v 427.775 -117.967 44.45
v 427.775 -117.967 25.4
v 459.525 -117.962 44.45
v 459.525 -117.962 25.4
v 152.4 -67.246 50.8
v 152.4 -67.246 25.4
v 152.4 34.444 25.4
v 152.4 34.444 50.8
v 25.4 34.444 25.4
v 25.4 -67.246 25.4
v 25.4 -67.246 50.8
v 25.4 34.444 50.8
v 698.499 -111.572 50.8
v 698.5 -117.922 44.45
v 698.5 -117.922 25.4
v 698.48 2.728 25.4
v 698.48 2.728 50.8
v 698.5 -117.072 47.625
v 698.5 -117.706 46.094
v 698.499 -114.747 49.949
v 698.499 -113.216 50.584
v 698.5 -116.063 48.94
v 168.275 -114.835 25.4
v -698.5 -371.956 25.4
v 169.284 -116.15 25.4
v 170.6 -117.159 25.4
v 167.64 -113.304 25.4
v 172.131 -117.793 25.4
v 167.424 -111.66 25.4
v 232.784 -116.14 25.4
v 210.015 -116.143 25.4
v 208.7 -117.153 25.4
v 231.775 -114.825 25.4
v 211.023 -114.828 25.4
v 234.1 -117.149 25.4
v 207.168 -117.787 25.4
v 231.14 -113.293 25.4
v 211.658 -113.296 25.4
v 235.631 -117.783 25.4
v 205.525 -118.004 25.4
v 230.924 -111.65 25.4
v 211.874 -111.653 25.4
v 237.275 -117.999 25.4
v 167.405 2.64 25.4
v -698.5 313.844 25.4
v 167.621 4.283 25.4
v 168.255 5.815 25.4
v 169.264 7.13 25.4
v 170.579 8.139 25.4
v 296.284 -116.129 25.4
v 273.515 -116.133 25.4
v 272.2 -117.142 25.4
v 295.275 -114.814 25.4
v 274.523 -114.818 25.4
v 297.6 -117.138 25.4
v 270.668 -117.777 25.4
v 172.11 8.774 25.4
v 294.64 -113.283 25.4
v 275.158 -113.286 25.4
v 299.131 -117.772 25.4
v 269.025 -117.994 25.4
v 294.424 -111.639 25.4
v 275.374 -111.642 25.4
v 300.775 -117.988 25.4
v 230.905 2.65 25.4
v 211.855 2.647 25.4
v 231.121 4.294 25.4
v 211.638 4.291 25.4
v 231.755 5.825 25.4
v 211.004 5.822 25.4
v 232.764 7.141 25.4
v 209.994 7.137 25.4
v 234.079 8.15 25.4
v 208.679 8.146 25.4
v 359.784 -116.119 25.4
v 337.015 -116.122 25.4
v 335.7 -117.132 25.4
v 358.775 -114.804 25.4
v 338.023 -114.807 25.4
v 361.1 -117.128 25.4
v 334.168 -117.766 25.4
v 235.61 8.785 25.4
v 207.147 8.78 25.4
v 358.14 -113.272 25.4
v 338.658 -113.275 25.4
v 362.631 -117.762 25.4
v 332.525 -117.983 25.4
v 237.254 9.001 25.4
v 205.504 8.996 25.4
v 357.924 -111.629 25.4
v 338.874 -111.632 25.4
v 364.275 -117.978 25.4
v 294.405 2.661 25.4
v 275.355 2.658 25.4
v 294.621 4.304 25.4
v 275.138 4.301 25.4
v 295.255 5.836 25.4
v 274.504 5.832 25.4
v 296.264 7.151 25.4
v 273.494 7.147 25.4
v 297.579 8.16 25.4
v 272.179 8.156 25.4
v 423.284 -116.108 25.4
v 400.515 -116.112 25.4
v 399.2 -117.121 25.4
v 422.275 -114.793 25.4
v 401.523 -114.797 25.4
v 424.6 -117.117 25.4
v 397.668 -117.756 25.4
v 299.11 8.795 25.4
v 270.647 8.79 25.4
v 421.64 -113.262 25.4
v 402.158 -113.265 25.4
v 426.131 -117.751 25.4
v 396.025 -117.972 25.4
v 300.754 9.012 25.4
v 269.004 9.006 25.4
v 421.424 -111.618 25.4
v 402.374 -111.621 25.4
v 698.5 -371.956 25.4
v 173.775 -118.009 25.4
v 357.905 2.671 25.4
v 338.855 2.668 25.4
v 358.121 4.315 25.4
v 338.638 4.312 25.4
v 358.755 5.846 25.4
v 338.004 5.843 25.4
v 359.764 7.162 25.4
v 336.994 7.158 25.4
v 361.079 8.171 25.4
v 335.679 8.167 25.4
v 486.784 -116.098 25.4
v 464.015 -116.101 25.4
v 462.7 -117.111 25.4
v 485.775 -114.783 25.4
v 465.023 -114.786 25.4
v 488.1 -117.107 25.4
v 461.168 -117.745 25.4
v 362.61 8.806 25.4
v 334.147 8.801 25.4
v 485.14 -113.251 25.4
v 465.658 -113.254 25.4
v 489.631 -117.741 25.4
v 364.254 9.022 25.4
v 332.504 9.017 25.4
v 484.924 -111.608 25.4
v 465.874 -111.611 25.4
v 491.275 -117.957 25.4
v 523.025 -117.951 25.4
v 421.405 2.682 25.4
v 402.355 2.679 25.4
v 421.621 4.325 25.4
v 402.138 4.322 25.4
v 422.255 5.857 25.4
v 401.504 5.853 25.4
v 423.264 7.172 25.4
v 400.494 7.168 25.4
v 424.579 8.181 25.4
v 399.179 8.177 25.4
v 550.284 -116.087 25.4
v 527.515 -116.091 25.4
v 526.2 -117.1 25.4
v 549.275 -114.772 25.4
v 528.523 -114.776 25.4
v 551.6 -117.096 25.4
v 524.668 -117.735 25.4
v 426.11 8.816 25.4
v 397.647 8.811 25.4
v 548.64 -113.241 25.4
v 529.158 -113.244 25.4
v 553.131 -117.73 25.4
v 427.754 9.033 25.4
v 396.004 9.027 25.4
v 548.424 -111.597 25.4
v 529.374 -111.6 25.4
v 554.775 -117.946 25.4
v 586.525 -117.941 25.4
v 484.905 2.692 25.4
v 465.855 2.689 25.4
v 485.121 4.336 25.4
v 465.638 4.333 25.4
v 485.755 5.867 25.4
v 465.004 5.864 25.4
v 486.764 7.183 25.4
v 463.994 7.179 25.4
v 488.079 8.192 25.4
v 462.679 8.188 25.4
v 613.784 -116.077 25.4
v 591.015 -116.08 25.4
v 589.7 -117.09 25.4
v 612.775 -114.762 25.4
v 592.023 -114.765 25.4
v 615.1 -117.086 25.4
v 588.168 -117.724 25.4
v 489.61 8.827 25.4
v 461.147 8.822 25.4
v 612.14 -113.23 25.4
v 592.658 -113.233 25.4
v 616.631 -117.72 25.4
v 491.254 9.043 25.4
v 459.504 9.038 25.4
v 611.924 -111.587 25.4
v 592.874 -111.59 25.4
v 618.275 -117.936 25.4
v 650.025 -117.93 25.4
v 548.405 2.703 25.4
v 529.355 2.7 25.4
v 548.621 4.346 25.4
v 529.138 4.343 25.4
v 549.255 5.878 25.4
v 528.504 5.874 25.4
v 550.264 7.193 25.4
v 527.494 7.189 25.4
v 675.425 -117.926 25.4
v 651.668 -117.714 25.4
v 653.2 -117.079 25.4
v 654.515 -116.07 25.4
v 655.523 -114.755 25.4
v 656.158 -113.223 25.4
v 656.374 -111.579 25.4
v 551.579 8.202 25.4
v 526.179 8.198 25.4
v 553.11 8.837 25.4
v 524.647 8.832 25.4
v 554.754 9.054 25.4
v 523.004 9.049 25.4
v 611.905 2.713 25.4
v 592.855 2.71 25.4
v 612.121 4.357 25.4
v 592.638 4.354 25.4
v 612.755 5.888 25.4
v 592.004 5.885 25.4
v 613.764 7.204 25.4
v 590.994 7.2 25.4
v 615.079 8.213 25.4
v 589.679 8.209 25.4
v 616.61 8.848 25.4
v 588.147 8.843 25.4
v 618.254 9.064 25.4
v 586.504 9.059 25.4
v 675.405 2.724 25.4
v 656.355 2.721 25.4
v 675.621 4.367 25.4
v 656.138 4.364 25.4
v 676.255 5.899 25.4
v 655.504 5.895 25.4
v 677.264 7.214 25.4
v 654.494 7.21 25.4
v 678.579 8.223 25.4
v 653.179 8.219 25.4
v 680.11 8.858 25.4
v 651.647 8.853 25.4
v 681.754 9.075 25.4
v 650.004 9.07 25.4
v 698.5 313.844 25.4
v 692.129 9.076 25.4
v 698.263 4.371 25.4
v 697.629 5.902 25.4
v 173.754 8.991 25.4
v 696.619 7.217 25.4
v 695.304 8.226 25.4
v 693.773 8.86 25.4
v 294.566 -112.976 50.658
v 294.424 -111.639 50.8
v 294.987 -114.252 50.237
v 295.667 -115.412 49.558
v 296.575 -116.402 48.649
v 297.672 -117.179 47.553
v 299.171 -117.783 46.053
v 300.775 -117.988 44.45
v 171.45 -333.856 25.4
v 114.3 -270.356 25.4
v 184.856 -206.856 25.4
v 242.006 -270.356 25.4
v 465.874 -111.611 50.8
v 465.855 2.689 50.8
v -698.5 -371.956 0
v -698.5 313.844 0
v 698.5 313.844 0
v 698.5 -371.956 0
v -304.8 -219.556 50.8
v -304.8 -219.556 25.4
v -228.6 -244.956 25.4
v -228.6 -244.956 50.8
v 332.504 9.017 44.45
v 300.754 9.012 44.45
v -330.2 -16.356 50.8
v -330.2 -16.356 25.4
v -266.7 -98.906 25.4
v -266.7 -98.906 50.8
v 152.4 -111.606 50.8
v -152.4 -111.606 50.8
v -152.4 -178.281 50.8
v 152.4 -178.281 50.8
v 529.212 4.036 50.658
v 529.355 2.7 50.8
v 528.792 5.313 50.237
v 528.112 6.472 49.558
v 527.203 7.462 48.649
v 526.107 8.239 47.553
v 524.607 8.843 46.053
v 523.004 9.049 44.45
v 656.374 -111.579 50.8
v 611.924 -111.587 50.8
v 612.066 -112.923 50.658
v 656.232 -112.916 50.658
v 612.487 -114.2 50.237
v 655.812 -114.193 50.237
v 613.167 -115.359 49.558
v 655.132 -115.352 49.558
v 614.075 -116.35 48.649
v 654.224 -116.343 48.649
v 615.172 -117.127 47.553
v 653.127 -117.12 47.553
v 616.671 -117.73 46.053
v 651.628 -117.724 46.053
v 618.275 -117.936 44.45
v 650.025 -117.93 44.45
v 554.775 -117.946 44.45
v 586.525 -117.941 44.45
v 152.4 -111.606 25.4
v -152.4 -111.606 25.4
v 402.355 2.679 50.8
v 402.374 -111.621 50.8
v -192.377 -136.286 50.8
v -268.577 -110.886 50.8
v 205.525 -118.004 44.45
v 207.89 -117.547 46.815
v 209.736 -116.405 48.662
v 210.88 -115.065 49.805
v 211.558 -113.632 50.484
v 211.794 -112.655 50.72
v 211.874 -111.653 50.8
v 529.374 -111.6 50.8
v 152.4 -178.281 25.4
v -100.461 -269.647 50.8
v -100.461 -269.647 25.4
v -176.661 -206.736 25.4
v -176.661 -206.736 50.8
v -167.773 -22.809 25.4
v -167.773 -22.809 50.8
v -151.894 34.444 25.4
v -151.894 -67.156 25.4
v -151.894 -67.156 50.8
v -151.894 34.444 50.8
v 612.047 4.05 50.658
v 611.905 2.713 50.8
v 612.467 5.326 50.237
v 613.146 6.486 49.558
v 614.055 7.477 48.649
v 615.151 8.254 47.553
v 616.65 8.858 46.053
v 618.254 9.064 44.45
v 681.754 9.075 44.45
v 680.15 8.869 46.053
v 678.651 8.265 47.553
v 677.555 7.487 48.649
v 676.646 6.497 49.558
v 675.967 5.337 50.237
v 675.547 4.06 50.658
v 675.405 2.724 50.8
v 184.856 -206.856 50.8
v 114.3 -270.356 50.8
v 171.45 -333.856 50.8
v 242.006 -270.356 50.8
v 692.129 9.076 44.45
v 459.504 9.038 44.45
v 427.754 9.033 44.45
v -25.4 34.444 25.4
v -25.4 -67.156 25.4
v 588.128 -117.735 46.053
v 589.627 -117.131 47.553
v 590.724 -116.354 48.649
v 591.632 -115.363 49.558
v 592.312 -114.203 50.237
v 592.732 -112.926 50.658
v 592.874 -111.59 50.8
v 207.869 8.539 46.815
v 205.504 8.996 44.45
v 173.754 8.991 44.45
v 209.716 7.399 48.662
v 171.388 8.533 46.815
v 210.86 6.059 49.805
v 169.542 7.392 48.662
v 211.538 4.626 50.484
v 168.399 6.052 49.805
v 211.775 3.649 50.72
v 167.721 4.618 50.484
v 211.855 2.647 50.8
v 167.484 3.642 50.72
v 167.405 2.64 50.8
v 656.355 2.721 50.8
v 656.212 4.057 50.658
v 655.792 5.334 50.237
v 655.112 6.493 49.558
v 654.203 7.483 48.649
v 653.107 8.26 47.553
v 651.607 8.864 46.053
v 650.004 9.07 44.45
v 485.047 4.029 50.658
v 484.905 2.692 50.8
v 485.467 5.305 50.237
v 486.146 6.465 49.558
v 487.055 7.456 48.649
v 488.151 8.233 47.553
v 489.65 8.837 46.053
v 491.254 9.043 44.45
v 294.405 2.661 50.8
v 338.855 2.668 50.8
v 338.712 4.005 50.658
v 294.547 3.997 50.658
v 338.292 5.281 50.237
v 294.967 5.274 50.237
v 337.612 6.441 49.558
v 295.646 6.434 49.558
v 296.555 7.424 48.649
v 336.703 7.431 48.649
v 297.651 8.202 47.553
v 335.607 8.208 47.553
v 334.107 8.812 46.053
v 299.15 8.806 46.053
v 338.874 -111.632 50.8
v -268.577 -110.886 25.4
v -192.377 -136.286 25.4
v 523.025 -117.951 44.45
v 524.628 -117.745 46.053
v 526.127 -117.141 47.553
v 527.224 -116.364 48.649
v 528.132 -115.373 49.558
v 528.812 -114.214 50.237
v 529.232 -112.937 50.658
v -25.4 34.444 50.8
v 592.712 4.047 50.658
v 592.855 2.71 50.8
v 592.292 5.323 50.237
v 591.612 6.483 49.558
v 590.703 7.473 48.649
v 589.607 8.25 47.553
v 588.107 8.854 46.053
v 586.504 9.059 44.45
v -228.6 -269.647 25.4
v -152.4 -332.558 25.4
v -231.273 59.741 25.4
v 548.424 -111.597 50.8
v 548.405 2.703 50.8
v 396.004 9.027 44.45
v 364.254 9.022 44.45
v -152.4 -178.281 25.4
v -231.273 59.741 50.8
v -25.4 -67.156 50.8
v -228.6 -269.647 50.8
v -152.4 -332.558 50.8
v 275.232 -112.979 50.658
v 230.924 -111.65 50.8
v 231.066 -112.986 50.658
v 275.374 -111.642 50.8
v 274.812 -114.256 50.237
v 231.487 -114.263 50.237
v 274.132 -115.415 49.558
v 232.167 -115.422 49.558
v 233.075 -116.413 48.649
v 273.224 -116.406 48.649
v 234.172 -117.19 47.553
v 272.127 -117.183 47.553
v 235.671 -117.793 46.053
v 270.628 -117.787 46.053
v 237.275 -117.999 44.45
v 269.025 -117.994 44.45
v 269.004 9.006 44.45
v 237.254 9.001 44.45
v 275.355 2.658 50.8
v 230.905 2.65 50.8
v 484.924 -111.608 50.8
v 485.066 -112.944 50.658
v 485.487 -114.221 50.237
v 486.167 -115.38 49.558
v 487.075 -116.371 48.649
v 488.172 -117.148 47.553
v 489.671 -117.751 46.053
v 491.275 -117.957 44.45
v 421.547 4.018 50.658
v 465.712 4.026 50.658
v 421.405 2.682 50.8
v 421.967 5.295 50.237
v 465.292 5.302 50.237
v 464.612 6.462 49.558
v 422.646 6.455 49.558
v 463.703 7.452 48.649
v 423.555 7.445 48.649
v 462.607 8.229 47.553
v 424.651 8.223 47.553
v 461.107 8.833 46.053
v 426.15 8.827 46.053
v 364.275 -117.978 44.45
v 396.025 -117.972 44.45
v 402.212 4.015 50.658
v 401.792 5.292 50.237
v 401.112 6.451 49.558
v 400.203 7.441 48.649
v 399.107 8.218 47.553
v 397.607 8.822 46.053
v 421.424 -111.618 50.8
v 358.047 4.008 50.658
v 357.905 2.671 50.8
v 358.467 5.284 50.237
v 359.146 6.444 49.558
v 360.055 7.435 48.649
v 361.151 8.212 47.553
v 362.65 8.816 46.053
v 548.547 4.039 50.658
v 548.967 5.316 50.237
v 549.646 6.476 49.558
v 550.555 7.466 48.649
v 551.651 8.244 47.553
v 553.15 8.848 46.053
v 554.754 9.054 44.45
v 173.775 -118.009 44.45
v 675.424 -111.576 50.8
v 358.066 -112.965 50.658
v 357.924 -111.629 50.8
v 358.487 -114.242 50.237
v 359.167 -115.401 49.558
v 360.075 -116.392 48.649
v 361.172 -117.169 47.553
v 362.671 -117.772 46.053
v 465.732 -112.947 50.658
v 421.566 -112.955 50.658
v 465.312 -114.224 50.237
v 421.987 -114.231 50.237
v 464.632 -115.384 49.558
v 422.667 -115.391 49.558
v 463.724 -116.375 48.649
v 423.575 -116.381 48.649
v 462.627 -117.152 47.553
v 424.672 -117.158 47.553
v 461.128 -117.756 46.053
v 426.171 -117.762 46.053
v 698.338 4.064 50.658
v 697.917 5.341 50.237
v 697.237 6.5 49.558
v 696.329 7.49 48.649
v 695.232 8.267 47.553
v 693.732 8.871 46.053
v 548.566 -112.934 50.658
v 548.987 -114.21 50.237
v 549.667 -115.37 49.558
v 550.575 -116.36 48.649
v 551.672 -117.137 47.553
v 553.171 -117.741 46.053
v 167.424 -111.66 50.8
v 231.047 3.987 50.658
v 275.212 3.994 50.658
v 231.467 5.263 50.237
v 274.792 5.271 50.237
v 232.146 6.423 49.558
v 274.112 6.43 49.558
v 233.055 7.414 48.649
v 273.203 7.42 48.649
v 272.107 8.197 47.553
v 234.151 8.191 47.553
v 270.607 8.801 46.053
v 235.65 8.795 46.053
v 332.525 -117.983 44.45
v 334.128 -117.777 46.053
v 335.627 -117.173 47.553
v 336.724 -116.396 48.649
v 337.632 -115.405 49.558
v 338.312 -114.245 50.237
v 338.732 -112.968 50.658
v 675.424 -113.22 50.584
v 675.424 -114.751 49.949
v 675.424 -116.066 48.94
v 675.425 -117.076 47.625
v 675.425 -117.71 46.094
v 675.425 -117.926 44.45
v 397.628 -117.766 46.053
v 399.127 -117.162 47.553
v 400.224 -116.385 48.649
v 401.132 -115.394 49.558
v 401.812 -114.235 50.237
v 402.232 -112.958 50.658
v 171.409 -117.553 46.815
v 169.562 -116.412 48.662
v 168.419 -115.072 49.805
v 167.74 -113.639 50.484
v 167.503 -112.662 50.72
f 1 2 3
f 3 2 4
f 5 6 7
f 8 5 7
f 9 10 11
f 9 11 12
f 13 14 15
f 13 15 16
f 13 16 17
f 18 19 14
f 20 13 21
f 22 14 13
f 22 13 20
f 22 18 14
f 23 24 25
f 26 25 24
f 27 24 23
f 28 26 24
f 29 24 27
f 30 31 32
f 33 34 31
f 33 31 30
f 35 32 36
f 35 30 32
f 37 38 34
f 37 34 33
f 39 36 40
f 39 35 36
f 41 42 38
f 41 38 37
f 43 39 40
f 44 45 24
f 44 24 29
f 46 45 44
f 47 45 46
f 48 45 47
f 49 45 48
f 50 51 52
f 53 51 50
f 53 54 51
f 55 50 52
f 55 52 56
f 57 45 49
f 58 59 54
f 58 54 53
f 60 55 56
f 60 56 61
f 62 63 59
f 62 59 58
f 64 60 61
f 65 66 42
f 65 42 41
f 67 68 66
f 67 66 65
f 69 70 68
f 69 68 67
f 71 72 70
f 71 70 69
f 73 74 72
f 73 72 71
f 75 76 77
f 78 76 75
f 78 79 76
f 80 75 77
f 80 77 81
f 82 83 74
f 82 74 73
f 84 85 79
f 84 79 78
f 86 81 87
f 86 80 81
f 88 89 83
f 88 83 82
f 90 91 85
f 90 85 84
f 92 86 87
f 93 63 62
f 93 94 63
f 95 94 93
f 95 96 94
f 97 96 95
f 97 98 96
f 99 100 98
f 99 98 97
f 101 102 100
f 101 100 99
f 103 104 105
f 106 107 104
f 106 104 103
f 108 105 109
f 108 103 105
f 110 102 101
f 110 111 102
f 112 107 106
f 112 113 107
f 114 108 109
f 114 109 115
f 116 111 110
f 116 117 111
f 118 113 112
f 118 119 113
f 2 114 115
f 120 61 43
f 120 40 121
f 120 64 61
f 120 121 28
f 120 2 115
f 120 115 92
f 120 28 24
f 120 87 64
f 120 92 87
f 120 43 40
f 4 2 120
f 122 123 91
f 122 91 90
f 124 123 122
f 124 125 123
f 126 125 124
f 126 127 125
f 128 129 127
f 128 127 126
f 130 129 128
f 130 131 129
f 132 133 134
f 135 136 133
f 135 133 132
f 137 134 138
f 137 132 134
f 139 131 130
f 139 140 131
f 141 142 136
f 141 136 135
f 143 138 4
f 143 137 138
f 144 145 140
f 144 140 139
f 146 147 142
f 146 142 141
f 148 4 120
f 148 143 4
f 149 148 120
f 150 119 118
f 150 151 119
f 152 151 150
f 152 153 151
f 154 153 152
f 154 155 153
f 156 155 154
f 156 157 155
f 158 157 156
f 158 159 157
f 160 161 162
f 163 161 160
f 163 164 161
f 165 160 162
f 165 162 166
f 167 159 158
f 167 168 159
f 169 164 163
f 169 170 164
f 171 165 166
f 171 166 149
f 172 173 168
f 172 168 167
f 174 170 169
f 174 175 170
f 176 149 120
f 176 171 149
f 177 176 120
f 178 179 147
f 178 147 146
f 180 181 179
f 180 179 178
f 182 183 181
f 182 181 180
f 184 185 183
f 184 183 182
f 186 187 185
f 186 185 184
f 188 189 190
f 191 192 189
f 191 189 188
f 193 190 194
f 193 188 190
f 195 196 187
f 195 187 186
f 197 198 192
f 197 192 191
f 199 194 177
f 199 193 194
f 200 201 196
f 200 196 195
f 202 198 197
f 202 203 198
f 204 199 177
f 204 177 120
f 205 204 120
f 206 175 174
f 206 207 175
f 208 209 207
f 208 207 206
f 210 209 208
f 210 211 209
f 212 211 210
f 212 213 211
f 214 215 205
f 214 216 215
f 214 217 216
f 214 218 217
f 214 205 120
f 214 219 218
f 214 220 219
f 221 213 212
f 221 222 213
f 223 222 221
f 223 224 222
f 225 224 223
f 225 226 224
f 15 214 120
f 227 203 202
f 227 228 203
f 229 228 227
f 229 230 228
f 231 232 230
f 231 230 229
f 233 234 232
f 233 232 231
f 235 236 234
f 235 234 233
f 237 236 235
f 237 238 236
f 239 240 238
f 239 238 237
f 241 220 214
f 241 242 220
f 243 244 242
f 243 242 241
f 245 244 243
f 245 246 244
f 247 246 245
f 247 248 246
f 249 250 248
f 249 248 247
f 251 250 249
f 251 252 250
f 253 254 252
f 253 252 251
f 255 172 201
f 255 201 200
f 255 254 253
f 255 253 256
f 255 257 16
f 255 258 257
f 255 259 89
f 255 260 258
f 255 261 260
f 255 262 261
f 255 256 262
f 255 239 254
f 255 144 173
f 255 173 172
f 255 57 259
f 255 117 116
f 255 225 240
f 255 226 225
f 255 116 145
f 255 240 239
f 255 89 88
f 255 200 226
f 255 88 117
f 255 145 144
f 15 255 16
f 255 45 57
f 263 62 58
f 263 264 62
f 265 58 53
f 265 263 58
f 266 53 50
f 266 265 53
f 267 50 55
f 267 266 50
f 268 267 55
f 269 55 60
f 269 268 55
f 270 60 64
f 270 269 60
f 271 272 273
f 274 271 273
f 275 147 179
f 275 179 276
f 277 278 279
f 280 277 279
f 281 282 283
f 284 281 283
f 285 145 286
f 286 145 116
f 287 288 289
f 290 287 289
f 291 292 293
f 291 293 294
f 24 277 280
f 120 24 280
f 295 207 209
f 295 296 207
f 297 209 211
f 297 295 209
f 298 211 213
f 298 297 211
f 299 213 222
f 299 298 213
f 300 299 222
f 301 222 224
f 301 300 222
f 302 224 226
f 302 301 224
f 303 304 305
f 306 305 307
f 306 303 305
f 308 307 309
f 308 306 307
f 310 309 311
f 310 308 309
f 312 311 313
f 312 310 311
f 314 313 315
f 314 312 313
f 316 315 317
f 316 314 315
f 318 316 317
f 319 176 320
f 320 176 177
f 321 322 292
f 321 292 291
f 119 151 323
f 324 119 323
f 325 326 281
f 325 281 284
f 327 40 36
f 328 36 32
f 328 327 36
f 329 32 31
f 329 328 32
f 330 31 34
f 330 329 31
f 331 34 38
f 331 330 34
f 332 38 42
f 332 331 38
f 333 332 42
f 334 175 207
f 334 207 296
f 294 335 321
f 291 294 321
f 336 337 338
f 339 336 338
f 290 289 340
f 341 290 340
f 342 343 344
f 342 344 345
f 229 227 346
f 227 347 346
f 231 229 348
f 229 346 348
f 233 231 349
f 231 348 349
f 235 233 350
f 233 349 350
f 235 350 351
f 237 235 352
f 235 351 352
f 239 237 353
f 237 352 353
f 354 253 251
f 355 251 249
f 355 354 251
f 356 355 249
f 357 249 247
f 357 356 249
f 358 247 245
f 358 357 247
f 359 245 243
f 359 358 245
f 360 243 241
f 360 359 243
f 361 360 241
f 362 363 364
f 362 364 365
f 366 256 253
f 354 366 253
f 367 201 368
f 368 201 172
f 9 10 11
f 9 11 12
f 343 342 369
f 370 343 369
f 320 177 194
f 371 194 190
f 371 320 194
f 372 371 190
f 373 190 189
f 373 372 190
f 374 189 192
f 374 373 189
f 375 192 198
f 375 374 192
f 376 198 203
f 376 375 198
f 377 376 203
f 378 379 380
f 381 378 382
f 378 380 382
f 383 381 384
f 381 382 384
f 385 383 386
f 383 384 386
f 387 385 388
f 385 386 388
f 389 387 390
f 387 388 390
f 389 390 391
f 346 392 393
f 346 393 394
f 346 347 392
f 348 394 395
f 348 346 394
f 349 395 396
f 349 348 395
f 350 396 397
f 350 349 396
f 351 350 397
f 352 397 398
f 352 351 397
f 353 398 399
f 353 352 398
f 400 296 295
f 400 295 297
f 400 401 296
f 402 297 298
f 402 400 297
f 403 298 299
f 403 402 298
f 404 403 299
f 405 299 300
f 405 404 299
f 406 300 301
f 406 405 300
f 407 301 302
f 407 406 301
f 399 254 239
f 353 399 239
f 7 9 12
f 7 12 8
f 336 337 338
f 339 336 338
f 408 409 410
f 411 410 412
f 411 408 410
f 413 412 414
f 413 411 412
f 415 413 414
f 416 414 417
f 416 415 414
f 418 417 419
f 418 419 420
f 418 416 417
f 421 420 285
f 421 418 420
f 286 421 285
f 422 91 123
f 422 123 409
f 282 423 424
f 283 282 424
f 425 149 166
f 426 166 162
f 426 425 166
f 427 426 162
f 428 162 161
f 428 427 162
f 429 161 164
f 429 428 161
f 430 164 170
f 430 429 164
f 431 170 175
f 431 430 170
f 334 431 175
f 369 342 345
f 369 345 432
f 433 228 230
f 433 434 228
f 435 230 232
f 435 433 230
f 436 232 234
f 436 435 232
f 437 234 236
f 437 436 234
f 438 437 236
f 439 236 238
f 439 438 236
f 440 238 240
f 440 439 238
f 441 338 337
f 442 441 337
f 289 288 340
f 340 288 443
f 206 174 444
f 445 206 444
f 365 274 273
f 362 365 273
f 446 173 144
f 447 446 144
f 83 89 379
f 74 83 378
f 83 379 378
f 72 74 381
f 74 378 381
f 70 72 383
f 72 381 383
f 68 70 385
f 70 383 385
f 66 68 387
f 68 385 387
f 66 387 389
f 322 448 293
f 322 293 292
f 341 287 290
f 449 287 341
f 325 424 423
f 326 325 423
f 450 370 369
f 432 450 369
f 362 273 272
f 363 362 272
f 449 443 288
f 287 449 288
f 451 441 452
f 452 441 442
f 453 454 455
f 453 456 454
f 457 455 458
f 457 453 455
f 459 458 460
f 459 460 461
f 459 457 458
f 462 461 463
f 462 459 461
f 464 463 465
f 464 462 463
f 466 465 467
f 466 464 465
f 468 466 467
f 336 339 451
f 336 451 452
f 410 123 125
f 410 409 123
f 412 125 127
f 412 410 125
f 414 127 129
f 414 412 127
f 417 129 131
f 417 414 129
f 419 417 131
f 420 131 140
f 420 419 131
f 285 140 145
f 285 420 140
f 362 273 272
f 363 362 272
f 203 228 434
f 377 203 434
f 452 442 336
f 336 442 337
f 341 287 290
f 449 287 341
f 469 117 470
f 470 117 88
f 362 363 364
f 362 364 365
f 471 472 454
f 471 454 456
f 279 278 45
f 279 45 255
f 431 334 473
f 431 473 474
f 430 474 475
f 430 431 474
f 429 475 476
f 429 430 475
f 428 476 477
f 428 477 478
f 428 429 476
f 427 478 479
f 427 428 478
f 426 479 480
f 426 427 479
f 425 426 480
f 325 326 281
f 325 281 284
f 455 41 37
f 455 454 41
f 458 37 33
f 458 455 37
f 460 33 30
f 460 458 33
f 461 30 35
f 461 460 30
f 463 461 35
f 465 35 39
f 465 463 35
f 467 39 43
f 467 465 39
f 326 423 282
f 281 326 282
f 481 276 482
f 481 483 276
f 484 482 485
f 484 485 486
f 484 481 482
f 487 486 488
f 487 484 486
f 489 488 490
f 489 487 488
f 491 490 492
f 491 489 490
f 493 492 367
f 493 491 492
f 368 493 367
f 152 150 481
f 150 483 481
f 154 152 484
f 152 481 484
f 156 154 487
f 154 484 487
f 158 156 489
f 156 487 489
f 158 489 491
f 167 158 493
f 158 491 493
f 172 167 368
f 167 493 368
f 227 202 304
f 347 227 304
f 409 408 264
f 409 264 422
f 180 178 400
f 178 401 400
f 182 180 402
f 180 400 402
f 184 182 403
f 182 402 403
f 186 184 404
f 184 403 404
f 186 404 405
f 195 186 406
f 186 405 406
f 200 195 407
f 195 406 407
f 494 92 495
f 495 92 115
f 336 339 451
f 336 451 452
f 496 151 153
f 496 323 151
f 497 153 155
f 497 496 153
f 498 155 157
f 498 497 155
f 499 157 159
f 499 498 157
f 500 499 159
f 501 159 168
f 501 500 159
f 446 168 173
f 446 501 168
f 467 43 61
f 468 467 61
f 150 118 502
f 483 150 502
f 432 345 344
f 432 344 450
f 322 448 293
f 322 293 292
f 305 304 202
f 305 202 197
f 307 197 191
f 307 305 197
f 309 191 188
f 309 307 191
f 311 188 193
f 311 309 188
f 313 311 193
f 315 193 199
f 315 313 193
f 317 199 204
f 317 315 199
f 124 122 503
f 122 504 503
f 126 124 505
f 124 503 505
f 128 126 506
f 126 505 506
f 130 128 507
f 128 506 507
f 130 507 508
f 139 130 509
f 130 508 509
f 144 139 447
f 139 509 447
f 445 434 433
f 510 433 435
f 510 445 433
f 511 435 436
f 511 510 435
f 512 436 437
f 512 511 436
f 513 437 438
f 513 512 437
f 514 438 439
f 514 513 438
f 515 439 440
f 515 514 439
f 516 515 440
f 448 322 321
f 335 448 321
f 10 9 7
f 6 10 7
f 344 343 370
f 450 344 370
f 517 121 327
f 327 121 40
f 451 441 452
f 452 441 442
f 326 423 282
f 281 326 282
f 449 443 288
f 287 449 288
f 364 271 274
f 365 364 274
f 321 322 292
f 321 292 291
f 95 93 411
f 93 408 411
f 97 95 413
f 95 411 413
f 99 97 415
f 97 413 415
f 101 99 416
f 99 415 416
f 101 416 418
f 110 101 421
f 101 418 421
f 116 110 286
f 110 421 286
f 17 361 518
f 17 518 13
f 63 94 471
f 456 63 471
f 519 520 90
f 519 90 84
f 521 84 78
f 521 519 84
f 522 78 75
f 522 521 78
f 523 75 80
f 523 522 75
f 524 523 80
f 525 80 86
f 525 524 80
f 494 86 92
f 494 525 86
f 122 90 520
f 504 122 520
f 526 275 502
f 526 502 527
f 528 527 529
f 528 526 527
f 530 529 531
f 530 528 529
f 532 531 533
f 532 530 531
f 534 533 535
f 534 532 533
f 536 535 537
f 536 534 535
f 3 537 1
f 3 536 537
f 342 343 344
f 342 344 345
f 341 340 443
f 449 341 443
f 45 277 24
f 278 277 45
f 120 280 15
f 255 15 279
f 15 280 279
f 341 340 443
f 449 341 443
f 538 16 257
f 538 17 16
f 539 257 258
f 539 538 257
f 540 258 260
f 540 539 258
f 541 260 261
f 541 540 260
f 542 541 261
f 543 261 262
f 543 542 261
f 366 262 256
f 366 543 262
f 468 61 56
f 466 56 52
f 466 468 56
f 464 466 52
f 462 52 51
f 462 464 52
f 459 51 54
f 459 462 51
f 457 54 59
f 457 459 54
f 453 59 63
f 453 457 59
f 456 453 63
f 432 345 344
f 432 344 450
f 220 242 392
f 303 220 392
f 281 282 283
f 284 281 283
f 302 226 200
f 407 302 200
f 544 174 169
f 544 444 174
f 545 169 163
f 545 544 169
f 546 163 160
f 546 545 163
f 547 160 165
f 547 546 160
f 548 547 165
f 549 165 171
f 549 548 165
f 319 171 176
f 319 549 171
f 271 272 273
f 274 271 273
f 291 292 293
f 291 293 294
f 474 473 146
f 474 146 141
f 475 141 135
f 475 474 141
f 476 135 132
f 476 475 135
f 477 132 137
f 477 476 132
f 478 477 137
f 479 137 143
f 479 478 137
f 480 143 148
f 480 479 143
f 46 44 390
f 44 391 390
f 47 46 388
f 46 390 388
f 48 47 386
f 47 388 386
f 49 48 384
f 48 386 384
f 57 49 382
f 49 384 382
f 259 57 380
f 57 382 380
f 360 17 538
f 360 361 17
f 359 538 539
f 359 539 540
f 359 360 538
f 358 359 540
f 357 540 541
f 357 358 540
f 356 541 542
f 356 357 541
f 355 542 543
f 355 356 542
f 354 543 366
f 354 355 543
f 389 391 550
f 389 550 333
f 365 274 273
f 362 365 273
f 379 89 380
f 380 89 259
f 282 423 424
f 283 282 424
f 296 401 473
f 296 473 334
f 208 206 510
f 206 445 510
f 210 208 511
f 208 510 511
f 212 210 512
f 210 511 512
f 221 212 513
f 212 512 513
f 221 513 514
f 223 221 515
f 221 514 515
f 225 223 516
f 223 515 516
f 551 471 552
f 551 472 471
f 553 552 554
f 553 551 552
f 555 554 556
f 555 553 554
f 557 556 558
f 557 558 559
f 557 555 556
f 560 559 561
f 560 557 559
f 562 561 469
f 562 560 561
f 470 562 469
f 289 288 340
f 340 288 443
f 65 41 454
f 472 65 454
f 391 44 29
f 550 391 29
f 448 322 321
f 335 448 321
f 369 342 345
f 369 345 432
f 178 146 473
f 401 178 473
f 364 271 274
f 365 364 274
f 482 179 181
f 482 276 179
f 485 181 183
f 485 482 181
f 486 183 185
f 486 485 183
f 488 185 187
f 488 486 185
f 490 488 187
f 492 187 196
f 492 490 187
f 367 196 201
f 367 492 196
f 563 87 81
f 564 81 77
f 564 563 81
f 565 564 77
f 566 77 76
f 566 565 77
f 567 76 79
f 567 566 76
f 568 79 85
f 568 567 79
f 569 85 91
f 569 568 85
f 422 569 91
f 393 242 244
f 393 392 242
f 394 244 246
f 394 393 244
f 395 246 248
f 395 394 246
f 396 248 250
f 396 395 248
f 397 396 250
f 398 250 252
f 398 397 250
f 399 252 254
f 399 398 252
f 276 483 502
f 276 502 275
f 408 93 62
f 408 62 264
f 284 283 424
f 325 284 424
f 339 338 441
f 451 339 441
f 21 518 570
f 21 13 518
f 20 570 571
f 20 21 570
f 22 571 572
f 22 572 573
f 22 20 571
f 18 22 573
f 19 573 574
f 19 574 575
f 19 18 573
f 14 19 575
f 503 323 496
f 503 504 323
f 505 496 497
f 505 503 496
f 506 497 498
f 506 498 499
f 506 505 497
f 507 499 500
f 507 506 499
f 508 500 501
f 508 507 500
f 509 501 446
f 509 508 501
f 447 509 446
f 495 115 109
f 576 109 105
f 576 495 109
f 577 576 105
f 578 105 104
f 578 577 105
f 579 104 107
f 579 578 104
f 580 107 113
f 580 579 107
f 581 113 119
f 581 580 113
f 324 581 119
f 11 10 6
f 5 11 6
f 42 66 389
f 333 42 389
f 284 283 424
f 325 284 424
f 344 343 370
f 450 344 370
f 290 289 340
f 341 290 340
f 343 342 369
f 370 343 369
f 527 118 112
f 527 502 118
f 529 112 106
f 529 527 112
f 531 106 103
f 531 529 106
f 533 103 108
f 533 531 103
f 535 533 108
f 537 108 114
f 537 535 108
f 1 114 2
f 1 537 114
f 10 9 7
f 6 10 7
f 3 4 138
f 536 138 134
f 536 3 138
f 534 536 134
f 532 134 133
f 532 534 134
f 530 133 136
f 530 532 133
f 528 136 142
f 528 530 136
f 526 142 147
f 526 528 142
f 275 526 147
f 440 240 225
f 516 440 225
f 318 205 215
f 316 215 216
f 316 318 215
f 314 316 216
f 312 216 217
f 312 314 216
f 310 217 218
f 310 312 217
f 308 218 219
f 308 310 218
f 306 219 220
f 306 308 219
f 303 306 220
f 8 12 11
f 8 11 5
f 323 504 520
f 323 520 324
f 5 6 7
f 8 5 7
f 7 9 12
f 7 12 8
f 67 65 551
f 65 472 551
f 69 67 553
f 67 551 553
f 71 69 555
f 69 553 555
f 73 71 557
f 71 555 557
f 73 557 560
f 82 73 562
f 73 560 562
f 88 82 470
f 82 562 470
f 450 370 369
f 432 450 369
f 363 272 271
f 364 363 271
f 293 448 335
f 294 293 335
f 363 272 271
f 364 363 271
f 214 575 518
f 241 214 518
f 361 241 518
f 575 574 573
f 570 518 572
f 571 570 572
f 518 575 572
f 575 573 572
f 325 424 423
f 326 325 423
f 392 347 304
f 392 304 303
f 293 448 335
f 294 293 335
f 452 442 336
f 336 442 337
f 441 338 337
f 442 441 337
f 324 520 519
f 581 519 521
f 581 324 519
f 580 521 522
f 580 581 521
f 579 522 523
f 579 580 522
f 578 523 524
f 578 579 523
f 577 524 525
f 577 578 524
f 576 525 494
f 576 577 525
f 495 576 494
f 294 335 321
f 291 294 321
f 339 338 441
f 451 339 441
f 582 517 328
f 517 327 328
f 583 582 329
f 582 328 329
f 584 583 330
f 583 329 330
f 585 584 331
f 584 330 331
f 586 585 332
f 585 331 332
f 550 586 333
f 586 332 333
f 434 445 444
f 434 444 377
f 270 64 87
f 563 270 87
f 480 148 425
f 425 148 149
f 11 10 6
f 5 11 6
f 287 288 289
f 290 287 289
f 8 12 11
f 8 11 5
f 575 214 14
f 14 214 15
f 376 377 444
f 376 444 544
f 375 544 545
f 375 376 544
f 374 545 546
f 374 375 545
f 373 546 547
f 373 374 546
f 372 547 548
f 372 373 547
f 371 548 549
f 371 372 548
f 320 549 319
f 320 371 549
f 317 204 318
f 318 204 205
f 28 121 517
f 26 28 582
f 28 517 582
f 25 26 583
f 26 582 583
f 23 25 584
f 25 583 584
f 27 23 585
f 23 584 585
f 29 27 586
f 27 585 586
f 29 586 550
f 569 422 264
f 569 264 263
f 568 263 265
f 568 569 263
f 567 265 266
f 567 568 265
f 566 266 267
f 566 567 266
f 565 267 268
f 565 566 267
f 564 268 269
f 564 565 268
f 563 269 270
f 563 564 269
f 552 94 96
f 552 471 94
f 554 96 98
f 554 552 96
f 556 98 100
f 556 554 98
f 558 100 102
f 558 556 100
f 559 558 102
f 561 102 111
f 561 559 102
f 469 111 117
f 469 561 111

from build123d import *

# Parameters (mm, degrees)
F0_W     = 1397
F0_H     = 685.8
F1_DEPTH = 25.4
F2_W     = 304.8
F2_H     = 66.675
F3_DEPTH = 25.4
F2_W_2   = 126.4937713082
F2_H_2   = 101.6
F2_W_3   = 127
F2_H_3   = 101.6898979807
F5_DEPTH = 25.4
F6_W     = 103.9247207072
F6_H     = 25.4
F6_W_2   = 19.05
F7_DEPTH = 203.2
F8_R     = 6.35
F9_DEPTH = 25.4


with BuildPart() as f1:
    # F0 (on Top) → F1 (new body)
    with BuildSketch(Plane.XY):
        with Locations((0, -29.0562831177)):
            Rectangle(F0_W, F0_H)
    extrude(amount=F1_DEPTH)

    # F4 (on face) → F5 (join)
    with BuildSketch(Plane.XY.offset(25.4)):
        Polygon((167.4247279687, -118.0103028116), (802.4247192862, -117.9052940253), (802.4037175289, 9.0947042382), (167.4037262115, 8.9896954519), align=None)
    extrude(amount=F5_DEPTH)

    # F6 (on face) → F7 (cut)
    with BuildSketch(Plane(origin=(0.0195197257, -118.0379863045, 0), x_dir=(0.9999999863, 0.0001653682, 0), z_dir=(0.0001653682, -0.9999999863, 0))):
        with Locations((750.4428501784, 38.1)):
            Rectangle(F6_W, F6_H)
        with Locations((665.880210532, 38.1)):
            Rectangle(F6_W_2, F6_H)
        with Locations((602.380210532, 38.1)):
            Rectangle(F6_W_2, F6_H)
        with Locations((538.880210532, 38.1)):
            Rectangle(F6_W_2, F6_H)
        with Locations((475.380210532, 38.1)):
            Rectangle(F6_W_2, F6_H)
        with Locations((411.880210532, 38.1)):
            Rectangle(F6_W_2, F6_H)
        with Locations((348.380210532, 38.1)):
            Rectangle(F6_W_2, F6_H)
        with Locations((284.880210532, 38.1)):
            Rectangle(F6_W_2, F6_H)
        with Locations((221.380210532, 38.1)):
            Rectangle(F6_W_2, F6_H)
    extrude(amount=-F7_DEPTH, mode=Mode.SUBTRACT)

    # F8
    f8_edges = [f1.edges().sort_by_distance(p)[0] for p in [
        (189.649728, -118.006628, 50.8),
        (253.149727, -117.996127, 50.8),
        (316.649726, -117.985626, 50.8),
        (380.149725, -117.975125, 50.8),
        (443.649724, -117.964624, 50.8),
        (507.149723, -117.954123, 50.8),
        (570.649722, -117.943622, 50.8),
        (634.149722, -117.933121, 50.8),
        (634.12872, 9.066877, 50.8),
        (686.941359, 9.07561, 50.8),
        (686.962361, -117.924388, 50.8),
        (570.628721, 9.056376, 50.8),
        (507.128722, 9.045875, 50.8),
        (443.628722, 9.035374, 50.8),
        (189.628726, 8.993371, 50.8),
        (253.128725, 9.003872, 50.8),
        (316.628724, 9.014373, 50.8),
        (380.128723, 9.024873, 50.8),
        (167.424728, -118.010303, 38.1),
        (211.874727, -118.002952, 38.1),
        (230.924727, -117.999802, 38.1),
        (275.374726, -117.992451, 38.1),
        (294.424726, -117.989301, 38.1),
        (338.874726, -117.98195, 38.1),
        (357.924725, -117.9788, 38.1),
        (402.374725, -117.97145, 38.1),
        (421.424724, -117.968299, 38.1),
        (465.874724, -117.960949, 38.1),
        (484.924724, -117.957798, 38.1),
        (529.374723, -117.950448, 38.1),
        (548.424723, -117.947298, 38.1),
        (592.874722, -117.939947, 38.1),
        (611.924722, -117.936797, 38.1),
        (656.374721, -117.929446, 38.1),
        (211.853726, 8.997046, 38.1),
        (167.403726, 8.989695, 38.1),
        (230.903725, 9.000196, 38.1),
        (275.353725, 9.007547, 38.1),
        (294.403724, 9.010697, 38.1),
        (338.853724, 9.018048, 38.1),
        (357.903724, 9.021198, 38.1),
        (402.353723, 9.028549, 38.1),
        (421.403723, 9.031699, 38.1),
        (465.853722, 9.03905, 38.1),
        (484.903722, 9.0422, 38.1),
        (529.353721, 9.04955, 38.1),
        (548.403721, 9.052701, 38.1),
        (592.85372, 9.060051, 38.1),
        (611.90372, 9.063202, 38.1),
        (656.35372, 9.070552, 38.1),
        (675.403719, 9.073702, 38.1),
        (698.478998, 9.077518, 38.1),
    ]]
    fillet(f8_edges, radius=F8_R)


with BuildPart() as f3:
    # F2 (on face) → F3 (new body)
    with BuildSketch(Plane.XY.offset(25.4)):
        with Locations((0, -144.9437831177)):
            Rectangle(F2_W, F2_H)
    extrude(amount=F3_DEPTH)


with BuildPart() as f3b:
    # F2 (on face) → F3, piece 2 (new body)
    with BuildSketch(Plane.XY.offset(25.4)):
        with Locations((-88.6468856541, -16.3562831177)):
            Rectangle(F2_W_2, F2_H_2)
    extrude(amount=F3_DEPTH)


with BuildPart() as f3c:
    # F2 (on face) → F3, piece 3 (new body)
    with BuildSketch(Plane.XY.offset(25.4)):
        with Locations((88.9, -16.401232108)):
            Rectangle(F2_W_3, F2_H_3)
    extrude(amount=F3_DEPTH)


with BuildPart() as f3d:
    # F2 (on face) → F3, piece 4 (new body)
    with BuildSketch(Plane.XY.offset(25.4)):
        Polygon((-152.4, -332.5580318258), (-100.4607616062, -269.6472222172), (-176.6607616062, -206.7364126086), (-228.6, -269.6472222172), align=None)
    extrude(amount=F3_DEPTH)


with BuildPart() as f3e:
    # F2 (on face) → F3, piece 5 (new body)
    with BuildSketch(Plane.XY.offset(25.4)):
        Polygon((-228.6, -244.9562831177), (-192.3765150139, -136.2858281594), (-268.5765150139, -110.8858281594), (-304.8, -219.5562831177), align=None)
    extrude(amount=F3_DEPTH)


with BuildPart() as f3f:
    # F2 (on face) → F3, piece 6 (new body)
    with BuildSketch(Plane.XY.offset(25.4)):
        Polygon((-266.7, -98.9062831177), (-167.7734755747, -22.8089566367), (-231.2734755747, 59.7410433633), (-330.2, -16.3562831177), align=None)
    extrude(amount=F3_DEPTH)


with BuildPart() as f3g:
    # F2 (on face) → F3, piece 7 (new body)
    with BuildSketch(Plane.XY.offset(25.4)):
        Polygon((184.8555555556, -206.8562831177), (114.3, -270.3562831177), (171.45, -333.8562831177), (242.0055555556, -270.3562831177), align=None)
    extrude(amount=F3_DEPTH)


with BuildPart() as f9:
    # F2 (on face) → F9 (new body)
    with BuildSketch(Plane.XY.offset(25.4)):
        with Locations((0, -144.9437831177)):
            Rectangle(F2_W, F2_H)
    extrude(amount=F9_DEPTH)


with BuildPart() as f9b:
    # F2 (on face) → F9, piece 2 (new body)
    with BuildSketch(Plane.XY.offset(25.4)):
        with Locations((-88.6468856541, -16.3562831177)):
            Rectangle(F2_W_2, F2_H_2)
    extrude(amount=F9_DEPTH)


with BuildPart() as f9c:
    # F2 (on face) → F9, piece 3 (new body)
    with BuildSketch(Plane.XY.offset(25.4)):
        with Locations((88.9, -16.401232108)):
            Rectangle(F2_W_3, F2_H_3)
    extrude(amount=F9_DEPTH)


with BuildPart() as f9d:
    # F2 (on face) → F9, piece 4 (new body)
    with BuildSketch(Plane.XY.offset(25.4)):
        Polygon((-152.4, -332.5580318258), (-100.4607616062, -269.6472222172), (-176.6607616062, -206.7364126086), (-228.6, -269.6472222172), align=None)
    extrude(amount=F9_DEPTH)


with BuildPart() as f9e:
    # F2 (on face) → F9, piece 5 (new body)
    with BuildSketch(Plane.XY.offset(25.4)):
        Polygon((-228.6, -244.9562831177), (-192.3765150139, -136.2858281594), (-268.5765150139, -110.8858281594), (-304.8, -219.5562831177), align=None)
    extrude(amount=F9_DEPTH)


with BuildPart() as f9f:
    # F2 (on face) → F9, piece 6 (new body)
    with BuildSketch(Plane.XY.offset(25.4)):
        Polygon((-266.7, -98.9062831177), (-167.7734755747, -22.8089566367), (-231.2734755747, 59.7410433633), (-330.2, -16.3562831177), align=None)
    extrude(amount=F9_DEPTH)


with BuildPart() as f9g:
    # F2 (on face) → F9, piece 7 (new body)
    with BuildSketch(Plane.XY.offset(25.4)):
        Polygon((184.8555555556, -206.8562831177), (114.3, -270.3562831177), (171.45, -333.8562831177), (242.0055555556, -270.3562831177), align=None)
    extrude(amount=F9_DEPTH)


solid = Compound([f1.part, f3.part, f3b.part, f3c.part, f3d.part, f3e.part, f3f.part, f3g.part, f9.part, f9b.part, f9c.part, f9d.part, f9e.part, f9f.part, f9g.part])
